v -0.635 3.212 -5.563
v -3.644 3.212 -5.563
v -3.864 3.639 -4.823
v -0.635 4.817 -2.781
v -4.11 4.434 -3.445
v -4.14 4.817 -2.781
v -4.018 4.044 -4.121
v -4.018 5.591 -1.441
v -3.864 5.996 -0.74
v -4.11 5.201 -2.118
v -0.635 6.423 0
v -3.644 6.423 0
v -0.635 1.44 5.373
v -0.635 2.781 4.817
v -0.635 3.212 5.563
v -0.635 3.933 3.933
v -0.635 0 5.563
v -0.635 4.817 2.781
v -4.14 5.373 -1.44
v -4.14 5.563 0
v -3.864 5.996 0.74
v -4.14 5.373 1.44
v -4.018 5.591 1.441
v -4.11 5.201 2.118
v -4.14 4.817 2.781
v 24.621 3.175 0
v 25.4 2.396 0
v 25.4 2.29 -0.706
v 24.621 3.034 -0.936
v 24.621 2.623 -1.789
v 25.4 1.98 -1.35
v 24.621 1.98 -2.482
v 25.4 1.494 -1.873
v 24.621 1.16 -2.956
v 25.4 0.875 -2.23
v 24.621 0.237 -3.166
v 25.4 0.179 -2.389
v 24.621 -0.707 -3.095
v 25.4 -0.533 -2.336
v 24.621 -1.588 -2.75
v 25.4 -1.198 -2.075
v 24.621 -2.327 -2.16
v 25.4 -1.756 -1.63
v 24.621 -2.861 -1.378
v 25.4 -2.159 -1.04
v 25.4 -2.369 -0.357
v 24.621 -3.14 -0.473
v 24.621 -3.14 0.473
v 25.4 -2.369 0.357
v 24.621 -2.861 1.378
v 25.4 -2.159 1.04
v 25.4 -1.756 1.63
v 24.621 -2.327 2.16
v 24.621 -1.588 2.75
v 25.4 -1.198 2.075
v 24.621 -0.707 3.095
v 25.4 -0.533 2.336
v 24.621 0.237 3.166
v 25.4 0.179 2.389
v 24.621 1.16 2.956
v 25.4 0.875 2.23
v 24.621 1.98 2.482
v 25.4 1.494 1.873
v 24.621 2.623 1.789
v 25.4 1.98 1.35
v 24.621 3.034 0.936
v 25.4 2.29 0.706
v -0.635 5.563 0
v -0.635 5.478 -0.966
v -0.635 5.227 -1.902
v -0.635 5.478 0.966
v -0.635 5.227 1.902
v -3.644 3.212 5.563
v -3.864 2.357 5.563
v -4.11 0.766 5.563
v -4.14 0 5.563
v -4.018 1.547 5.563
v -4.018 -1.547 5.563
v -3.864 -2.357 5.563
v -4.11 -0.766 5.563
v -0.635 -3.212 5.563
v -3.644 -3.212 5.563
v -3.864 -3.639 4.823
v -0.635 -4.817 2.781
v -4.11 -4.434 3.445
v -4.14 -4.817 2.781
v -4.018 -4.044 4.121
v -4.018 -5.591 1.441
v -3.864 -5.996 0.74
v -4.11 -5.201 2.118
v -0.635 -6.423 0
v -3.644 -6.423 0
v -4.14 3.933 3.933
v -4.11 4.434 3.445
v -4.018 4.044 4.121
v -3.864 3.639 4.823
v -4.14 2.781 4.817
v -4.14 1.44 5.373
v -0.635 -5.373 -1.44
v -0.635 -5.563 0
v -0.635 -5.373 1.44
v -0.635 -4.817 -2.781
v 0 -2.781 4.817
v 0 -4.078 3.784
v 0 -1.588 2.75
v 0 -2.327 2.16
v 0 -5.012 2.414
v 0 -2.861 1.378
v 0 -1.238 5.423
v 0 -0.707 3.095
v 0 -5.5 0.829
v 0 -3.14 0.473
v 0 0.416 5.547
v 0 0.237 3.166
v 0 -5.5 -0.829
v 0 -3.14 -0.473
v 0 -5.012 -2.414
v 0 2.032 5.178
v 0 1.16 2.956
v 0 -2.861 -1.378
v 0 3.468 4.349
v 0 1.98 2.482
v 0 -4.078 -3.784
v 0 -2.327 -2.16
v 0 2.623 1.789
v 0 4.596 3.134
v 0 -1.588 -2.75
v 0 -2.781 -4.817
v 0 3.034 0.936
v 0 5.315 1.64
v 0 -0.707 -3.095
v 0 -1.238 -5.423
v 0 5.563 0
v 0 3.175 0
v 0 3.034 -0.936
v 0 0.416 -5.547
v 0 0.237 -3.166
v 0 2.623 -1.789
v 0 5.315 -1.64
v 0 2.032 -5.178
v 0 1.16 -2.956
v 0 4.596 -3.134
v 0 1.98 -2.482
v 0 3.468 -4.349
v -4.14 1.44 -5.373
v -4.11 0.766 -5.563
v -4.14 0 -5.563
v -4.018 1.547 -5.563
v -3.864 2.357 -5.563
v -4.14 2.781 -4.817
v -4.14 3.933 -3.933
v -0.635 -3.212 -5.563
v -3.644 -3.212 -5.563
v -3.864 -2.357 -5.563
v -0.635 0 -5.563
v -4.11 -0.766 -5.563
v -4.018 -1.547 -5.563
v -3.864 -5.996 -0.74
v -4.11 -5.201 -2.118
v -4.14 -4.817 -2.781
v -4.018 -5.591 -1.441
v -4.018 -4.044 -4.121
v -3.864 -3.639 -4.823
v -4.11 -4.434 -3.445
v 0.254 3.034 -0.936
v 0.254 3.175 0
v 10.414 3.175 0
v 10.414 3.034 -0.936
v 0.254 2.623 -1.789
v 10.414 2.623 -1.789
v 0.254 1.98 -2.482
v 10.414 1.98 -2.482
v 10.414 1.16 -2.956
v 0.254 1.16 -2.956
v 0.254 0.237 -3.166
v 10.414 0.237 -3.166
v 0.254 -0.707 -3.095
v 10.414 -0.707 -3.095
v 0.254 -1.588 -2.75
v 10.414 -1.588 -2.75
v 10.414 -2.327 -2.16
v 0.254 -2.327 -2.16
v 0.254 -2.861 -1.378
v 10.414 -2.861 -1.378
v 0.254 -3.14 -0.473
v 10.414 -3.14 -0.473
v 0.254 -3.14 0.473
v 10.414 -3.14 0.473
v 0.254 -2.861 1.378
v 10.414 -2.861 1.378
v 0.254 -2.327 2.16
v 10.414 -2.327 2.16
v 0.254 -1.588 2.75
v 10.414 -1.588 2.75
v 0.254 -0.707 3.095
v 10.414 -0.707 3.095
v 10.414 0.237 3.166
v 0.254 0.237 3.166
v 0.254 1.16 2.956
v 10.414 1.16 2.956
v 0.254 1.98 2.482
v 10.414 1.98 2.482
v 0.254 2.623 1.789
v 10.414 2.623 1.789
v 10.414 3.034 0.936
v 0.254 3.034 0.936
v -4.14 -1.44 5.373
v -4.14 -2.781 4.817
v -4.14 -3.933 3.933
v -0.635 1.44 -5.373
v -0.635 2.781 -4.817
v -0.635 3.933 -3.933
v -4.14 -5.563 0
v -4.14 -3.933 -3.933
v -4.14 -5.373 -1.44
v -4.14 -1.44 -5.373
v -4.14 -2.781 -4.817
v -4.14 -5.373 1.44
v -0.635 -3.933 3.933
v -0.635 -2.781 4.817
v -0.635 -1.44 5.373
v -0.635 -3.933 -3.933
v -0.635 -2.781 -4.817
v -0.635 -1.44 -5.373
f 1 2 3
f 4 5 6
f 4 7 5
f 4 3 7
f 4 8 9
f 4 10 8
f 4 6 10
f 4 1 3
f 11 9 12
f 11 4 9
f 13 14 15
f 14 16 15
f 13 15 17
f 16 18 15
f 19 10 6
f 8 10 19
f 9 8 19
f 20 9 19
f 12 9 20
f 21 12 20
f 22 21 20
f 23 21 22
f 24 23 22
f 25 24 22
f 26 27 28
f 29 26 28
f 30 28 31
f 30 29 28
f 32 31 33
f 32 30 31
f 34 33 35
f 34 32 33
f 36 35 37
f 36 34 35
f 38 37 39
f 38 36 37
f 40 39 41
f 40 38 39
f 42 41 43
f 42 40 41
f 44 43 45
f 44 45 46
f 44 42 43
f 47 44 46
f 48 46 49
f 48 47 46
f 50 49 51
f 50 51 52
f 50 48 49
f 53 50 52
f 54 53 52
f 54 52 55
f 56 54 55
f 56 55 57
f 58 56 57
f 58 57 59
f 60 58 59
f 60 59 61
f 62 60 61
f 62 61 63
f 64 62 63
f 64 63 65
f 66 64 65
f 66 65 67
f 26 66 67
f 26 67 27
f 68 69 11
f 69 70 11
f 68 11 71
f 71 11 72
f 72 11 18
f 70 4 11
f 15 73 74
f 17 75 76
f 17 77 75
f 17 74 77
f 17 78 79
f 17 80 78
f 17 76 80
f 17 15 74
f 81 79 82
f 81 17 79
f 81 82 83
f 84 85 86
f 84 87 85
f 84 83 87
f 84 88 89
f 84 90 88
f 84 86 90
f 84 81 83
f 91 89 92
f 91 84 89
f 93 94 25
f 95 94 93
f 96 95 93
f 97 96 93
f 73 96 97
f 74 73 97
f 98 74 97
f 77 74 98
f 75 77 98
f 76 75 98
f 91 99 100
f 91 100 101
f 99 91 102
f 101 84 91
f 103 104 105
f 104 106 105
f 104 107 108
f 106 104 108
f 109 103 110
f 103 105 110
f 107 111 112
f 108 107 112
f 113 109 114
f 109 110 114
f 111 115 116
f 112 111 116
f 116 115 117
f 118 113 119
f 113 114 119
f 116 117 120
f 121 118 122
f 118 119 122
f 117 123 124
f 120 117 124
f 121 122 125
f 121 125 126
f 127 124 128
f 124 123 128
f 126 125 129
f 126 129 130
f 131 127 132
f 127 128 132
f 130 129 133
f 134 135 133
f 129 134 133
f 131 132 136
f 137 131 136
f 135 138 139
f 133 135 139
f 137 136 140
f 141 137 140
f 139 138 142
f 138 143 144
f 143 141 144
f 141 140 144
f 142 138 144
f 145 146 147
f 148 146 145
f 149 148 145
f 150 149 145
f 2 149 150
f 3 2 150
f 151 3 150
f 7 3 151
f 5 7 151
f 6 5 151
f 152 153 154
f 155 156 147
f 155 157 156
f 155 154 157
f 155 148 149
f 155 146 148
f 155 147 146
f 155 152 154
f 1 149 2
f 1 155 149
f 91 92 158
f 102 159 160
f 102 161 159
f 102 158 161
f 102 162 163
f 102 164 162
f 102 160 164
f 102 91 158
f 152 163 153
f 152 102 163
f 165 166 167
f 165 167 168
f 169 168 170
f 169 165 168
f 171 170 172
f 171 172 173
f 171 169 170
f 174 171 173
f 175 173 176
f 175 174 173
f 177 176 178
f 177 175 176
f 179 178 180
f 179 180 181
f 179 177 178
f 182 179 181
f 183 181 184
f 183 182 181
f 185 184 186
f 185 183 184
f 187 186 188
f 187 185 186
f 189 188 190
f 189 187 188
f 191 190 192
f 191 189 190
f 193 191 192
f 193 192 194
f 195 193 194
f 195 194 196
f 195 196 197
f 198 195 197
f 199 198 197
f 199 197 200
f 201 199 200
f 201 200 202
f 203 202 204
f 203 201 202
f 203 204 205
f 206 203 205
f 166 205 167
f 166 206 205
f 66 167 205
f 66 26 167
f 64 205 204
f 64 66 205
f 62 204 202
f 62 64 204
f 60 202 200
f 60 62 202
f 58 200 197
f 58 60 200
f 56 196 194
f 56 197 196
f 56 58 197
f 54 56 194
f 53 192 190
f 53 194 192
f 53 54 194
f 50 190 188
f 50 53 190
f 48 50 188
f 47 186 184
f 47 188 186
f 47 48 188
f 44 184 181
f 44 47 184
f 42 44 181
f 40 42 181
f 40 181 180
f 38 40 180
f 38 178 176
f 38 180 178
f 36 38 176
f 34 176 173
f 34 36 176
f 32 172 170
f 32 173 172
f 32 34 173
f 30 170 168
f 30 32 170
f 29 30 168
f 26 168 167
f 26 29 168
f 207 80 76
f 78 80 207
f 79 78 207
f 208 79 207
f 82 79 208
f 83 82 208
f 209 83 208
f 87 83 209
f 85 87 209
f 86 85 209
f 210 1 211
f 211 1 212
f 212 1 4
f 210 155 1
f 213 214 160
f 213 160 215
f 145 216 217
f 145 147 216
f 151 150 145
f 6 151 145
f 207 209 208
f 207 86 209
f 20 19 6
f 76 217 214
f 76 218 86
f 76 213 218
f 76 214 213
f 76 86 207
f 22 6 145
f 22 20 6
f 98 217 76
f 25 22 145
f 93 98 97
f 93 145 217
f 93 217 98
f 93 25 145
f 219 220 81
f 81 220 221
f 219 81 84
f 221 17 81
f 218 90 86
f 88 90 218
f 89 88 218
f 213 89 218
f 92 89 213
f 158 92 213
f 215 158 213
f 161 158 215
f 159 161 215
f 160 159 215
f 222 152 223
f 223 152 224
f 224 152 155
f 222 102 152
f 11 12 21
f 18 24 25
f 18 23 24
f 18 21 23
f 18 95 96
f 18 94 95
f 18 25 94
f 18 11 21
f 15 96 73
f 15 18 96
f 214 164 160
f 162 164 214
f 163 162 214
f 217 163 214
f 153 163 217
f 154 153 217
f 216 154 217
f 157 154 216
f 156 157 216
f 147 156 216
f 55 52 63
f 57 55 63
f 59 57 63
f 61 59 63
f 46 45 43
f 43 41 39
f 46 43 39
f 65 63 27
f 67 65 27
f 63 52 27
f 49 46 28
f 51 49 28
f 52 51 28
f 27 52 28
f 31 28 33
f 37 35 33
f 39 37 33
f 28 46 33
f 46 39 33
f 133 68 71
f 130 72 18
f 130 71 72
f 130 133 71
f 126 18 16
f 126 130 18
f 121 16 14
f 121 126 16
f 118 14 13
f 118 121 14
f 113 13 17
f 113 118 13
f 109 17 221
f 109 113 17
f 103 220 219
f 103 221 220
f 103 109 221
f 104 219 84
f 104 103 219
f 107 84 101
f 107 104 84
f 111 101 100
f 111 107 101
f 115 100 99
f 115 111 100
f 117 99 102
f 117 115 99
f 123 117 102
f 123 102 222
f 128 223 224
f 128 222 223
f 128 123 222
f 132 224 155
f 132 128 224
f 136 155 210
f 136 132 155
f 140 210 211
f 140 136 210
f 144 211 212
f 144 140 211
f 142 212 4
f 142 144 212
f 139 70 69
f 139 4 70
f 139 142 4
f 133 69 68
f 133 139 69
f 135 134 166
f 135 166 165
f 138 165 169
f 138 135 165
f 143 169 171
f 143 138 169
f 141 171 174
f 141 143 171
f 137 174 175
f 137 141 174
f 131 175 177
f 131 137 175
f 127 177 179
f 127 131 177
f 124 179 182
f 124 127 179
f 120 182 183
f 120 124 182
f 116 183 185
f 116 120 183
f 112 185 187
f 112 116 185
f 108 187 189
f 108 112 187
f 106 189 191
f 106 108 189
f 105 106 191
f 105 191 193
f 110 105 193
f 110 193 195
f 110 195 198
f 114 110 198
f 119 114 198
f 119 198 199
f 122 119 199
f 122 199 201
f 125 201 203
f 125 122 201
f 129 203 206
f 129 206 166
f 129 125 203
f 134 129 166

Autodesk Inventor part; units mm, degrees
ref_plane "YZ Plane" through (0, 0, 0) normal (1, 0, 0) x (0, 1, 0)
ref_plane "XZ Plane" through (0, 0, 0) normal (0, 1, 0) x (-1, 0, 0)
sketch "Sketch1" plane through (0, 0, 0) normal (0, 0, 1) x (1, 0, 0)
  line L0 (0, 5.5626) -> (0, 3.175)
  line L1 (10.414, 3.175) -> (25.4, 3.175)
  line L2 (25.4, 3.175) -> (25.4, 0)
  line L3 (25.4, 0) -> (-0.6351, 0)
  line L4 (-5.8421, 0) -> (30.607, 0) projected
  line L5 (-0.6351, 0) -> (-0.6351, 5.5626)
  line L6 (-0.6351, 5.5626) -> (0, 5.5626)
  line L7 (10.414, 3.175) -> (0.2539, 3.175)
  line L8 (0.2539, 3.175) -> (0, 3.175)
  line L9 (0, -1.1125) -> (0, 6.6751) projected
  dimension "d0" = 25.4
  dimension "d1" = 14.986
  dimension "d2" = 6.35
  dimension "d9" = 0.6351
  dimension "d10" = 11.1252
  dimension "d13" = 10.1601
  dimension "d14" = 6.35
revolve "Body" add sketch "Sketch1" angle 360 about axis through (25.4, 0, 0) along (-1, 0, 0)
sketch "Sketch2" plane through (-0.6351, 0, 0) normal (-1, 0, 0) x (0, 0, 1)
  line L0 (0, 6.4231) -> (5.5626, 3.2116)
  line L1 (5.5626, 3.2116) -> (5.5626, -3.2116)
  line L2 (5.5626, -3.2116) -> (0, -6.4231)
  line L3 (0, -6.4231) -> (-5.5626, -3.2116)
  line L4 (-5.5626, -3.2116) -> (-5.5626, 3.2116)
  line L5 (-5.5626, 3.2116) -> (0, 6.4231)
  point P0 (0, 0)
  point P1 (0, 0)
  dimension "d11" = 11.1252
extrude "Head" add sketch "Sketch2" along normal blind 3.5052
sketch "Sketch4" plane through (0, 0, 0) normal (0, 0, 1) x (1, 0, 0)
  line L0 (-4.1403, 5.5626) -> (-4.1403, 6.4231)
  line L1 (-4.1403, 6.4231) -> (-3.6435, 6.4231)
  line L2 (-3.6435, 6.4231) -> (-4.1403, 5.5626)
  line L3 (-4.8413, 0) -> (0.0659, 0) projected
  line L4 (-0.6351, 6.4231) -> (-4.1403, 6.4231) projected
  line L5 (-4.1403, 3.2116) -> (-4.1403, 6.4231) projected
  dimension "d5" = 30
  dimension "d19" = 11.1252
revolve "Chamfer1" cut sketch "Sketch4" angle 360 about axis through (-10, 0, 0) along (1, 0, 0)
thread "Thread" size "1/4-20 UNC" class "2A" standard "ANSI Unified Screw Threads" length 14.986
chamfer "Chamfer2" distance 0.779 distance2 0.7791 1 edges at (25.4, -3.175, 0) measured on face at (25.4, -0.1276, -1.0506)
ref_plane "Work Plane1" through (1.525, 0, 0) normal (0, 0, 1) x (1, 0, 0)
equation "\"d0\" = NLG"
equation "\"d1\" = GEL"
equation "\"d2\" = GD"
equation "\"d10\" = SD2"
equation "\"d14\" = BDM"
equation "\"d11\" = SW"
equation "\"d3\" = KOH - SD"
equation "\"d5\" = ANG1"
equation "\"d19\" = SW0"
equation "\"d15\" = GEL"
equation "\"d6\" = -0.5 * SPD + 0.5 * GD"
equation "\"NLG\" = 25.4"
equation "\"GD\" = 6.35"
equation "\"BDM\" = 6.35"
equation "\"KOH\" = 4.1402"
equation "\"GEL\" = 14.986"
equation "\"SW\" = 11.1252"
equation "\"SW0\" = SW"
equation "\"SPD\" = GD1"
equation "\"SD2\" = SW"
equation "\"SD\" = 0.635"
equation "\"ANG1\" = 30deg"
equation "\"GAL\" = 10.16"
equation "\"GUL\" = 0.77902"
equation "\"RR\" = 0.381"
equation "\"WFT\" = SD"
equation "\"GD1\" = 4.79196"
equation "\"THREADDIA\" = 6.35"
equation "\"SDH\" = SW"
equation "\"SDHG\" = 0.254"
equation "\"TOA\" = 30deg"
equation "\"FAWI\" = 45deg"
equation "\"NND\" = 6.35"
equation "\"E0\" = 12.84961"
properties part number "AS 2465 - 1/4 x 1  UNC" material "Steel, Mild"
